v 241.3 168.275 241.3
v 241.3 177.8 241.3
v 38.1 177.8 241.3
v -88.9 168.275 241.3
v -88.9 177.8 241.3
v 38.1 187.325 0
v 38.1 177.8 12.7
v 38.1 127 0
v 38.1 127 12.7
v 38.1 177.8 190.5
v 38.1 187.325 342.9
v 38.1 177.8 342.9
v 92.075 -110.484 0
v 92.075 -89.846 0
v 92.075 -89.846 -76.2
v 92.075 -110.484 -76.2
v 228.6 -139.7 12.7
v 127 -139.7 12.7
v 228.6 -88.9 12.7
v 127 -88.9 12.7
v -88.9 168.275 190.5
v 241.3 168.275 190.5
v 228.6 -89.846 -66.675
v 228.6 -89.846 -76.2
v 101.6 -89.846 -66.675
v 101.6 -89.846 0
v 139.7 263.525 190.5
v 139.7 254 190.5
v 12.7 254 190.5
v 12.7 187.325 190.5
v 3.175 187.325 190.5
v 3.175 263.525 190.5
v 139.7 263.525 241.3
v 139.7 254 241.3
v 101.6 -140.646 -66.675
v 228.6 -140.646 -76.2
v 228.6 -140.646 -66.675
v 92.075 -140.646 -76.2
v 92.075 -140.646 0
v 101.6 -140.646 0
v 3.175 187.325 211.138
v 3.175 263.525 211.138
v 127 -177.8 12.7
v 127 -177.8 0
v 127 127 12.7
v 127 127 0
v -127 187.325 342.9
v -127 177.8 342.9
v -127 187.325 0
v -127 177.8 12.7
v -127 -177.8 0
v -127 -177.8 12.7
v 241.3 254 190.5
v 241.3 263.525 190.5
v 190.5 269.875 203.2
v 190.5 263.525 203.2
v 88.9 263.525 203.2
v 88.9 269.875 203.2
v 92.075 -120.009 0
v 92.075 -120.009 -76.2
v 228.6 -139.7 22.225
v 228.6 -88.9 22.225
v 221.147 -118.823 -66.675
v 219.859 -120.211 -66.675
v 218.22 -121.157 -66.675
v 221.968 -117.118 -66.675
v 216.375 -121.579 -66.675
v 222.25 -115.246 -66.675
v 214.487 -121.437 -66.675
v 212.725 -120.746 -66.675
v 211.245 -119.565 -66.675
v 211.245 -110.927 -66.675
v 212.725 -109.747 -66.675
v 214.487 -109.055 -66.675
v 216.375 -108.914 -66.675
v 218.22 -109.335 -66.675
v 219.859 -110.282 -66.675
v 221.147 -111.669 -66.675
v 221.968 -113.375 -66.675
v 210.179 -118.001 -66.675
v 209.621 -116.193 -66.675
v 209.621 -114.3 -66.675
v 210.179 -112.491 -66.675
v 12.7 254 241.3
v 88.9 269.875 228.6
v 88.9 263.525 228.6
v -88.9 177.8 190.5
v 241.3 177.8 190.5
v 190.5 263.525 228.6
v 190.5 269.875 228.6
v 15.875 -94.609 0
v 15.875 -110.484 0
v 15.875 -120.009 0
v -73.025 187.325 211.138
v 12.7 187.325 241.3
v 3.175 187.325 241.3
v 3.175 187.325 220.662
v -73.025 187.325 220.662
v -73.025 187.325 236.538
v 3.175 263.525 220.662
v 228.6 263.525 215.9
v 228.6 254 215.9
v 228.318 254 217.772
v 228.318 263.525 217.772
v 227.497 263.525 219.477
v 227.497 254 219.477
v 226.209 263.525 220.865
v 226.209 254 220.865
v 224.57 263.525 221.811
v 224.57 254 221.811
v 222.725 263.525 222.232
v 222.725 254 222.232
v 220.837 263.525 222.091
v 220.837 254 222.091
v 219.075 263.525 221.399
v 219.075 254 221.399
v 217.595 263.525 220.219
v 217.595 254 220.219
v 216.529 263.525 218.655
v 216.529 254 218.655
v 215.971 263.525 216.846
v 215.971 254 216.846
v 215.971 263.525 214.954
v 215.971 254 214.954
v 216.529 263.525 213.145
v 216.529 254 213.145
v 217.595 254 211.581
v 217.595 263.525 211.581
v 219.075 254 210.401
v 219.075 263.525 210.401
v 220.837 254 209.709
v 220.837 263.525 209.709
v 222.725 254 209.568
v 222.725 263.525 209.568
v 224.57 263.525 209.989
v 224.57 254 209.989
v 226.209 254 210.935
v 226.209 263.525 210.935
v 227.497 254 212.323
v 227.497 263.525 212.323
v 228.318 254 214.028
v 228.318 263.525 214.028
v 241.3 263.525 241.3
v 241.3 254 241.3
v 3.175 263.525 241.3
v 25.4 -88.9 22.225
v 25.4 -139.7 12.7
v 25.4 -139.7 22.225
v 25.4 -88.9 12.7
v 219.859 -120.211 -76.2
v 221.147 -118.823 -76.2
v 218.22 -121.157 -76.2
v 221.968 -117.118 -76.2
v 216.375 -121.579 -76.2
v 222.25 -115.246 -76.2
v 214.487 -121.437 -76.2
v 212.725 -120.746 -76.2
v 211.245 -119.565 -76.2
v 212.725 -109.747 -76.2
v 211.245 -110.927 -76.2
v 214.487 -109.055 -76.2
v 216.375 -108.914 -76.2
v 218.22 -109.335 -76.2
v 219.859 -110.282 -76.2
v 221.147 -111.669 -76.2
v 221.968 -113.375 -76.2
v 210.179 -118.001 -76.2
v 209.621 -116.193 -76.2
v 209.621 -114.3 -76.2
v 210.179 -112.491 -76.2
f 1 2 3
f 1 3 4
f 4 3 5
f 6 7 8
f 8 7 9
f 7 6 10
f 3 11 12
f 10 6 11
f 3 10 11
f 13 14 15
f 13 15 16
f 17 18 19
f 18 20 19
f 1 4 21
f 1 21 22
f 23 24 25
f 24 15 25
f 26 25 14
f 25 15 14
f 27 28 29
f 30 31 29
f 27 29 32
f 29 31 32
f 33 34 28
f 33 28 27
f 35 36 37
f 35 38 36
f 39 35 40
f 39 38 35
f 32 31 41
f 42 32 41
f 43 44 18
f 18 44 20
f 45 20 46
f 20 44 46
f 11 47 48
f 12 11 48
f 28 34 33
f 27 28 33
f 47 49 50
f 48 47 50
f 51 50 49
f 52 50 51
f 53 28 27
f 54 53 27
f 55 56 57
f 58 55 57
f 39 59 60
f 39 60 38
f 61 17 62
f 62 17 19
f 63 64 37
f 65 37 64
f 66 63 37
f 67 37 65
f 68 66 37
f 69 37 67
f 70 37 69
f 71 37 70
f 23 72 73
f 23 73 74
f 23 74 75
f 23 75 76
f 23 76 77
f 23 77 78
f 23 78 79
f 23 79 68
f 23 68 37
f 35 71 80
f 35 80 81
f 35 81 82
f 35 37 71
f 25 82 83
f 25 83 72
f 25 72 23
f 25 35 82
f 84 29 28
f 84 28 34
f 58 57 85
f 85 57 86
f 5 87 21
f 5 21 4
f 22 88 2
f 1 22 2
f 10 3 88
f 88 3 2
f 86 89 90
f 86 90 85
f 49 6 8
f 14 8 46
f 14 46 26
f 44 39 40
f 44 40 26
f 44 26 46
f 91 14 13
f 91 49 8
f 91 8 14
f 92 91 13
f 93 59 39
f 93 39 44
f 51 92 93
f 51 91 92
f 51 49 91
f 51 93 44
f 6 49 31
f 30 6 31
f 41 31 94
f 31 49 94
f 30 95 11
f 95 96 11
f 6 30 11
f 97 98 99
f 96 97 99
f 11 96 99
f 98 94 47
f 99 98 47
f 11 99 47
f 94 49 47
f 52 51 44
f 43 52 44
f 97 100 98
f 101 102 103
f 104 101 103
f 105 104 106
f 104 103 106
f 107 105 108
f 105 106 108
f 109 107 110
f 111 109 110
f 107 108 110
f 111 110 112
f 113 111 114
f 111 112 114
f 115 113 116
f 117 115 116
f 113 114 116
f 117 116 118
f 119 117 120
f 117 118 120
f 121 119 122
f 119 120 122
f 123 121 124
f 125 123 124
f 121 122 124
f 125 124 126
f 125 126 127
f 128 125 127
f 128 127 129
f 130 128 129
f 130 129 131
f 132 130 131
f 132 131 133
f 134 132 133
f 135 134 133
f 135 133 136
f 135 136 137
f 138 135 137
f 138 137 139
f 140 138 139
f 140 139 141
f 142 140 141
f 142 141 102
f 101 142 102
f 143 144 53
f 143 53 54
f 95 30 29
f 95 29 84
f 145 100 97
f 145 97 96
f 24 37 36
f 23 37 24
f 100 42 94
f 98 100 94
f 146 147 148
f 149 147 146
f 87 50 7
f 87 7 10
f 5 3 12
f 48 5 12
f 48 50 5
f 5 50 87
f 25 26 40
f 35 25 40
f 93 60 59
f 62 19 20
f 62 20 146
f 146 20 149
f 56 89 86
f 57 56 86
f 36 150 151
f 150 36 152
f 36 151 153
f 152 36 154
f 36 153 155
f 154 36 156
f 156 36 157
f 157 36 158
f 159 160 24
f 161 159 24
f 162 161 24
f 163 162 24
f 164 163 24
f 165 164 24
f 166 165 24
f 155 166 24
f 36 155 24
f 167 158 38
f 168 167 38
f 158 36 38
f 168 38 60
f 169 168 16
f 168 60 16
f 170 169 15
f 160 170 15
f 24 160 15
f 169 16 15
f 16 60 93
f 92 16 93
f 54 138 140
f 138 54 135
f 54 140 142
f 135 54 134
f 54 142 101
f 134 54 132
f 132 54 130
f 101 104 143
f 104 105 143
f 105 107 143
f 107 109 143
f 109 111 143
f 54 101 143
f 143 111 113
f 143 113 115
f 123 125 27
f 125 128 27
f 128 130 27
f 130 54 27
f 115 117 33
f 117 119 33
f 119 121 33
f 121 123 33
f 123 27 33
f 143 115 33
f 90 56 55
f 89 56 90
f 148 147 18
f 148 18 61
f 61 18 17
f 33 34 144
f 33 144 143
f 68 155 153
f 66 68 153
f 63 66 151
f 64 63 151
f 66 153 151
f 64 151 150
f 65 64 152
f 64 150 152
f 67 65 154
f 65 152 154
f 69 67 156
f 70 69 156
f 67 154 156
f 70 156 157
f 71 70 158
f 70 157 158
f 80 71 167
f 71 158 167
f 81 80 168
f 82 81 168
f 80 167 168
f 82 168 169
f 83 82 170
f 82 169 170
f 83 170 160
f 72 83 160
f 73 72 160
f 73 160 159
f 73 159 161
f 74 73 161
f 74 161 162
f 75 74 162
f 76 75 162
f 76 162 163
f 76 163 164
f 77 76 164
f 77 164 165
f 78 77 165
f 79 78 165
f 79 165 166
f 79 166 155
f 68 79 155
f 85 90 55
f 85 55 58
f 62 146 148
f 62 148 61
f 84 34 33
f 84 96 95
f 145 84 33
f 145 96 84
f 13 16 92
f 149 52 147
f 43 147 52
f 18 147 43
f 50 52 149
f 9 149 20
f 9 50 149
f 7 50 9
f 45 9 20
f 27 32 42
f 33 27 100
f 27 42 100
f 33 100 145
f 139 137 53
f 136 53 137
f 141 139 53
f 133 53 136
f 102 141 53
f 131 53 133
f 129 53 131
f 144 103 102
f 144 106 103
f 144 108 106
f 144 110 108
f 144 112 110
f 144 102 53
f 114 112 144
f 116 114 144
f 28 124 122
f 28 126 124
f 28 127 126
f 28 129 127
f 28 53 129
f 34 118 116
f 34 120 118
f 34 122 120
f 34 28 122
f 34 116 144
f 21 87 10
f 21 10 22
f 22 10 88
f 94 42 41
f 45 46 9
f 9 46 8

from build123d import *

# Parameters (mm, degrees)
F1_DEPTH   = 12.7
F2_W       = 101.6
F2_H       = 50.8
F3_DEPTH   = 9.525
F4_W       = 9.525
F4_H       = 342.9
F5_DEPTH   = 165.1
F6_W       = 127
F6_H       = 50.8
F6_W_2     = 203.2
F7_DEPTH   = 9.525
F8_W       = 9.525
F8_H       = 50.8
F9_DEPTH   = 76.2
F10_W      = 50.8
F10_H      = 9.525
F11_DEPTH  = 127
F12_W      = 9.525
F12_H      = 76.2
F13_DEPTH  = 76.2
F15_DEPTH  = 25.4
F16_R      = 6.35
F17_DEPTH  = 25.4
F18_W      = 9.525
F18_H      = 50.8
F19_DEPTH  = 76.2
F20_W      = 9.525
F20_H      = 50.8
F21_DEPTH  = 127
F21_FACE_W = 9.525
F21_FACE_H = 50.8
F22_DEPTH  = 101.6
F23_W      = 101.6
F23_H      = 25.4
F24_DEPTH  = 6.35
F25_R      = 6.35
F26_DEPTH  = 25.4
F27_W      = 76.2
F27_H      = 9.525
F28_DEPTH  = 76.2
F30_DEPTH  = 25.4


with BuildPart() as f1:
    # F0 (on Top) → F1 (new body)
    with BuildSketch(Plane.XY):
        Polygon((-127, -177.8), (127, -177.8), (127, 127), (38.1, 127), (38.1, 177.8), (-127, 177.8), align=None)
    extrude(amount=F1_DEPTH)

    # F2 (on face) → F3 (join)
    with BuildSketch(Plane.XY.offset(12.7)):
        with Locations((177.8, -114.3)):
            Rectangle(F2_W, F2_H)
        with Locations((76.2, -114.3)):
            Rectangle(F2_W, F2_H)
    extrude(amount=F3_DEPTH)

    # F4 (on face) → F5 (join, through all)
    with BuildSketch(Plane(origin=(-127, 0, 0), x_dir=(0, -1, 0), z_dir=(-1, 0, 0))):
        with Locations((-182.5625, 171.45)):
            Rectangle(F4_W, F4_H)
    extrude(amount=-F5_DEPTH)

    # F6 (on face) → F7 (join)
    with BuildSketch(Plane.XZ.offset(-177.8)):
        with Locations((-25.4, 215.9)):
            Rectangle(F6_W, F6_H)
        with Locations((139.7, 215.9)):
            Rectangle(F6_W_2, F6_H)
    extrude(amount=F7_DEPTH)

    # F8 (on face) → F9 (join)
    with BuildSketch(Plane(origin=(0, 0, 0), x_dir=(1, 0, 0), z_dir=(0, 0, -1))):
        with Locations((96.8375, 115.246274)):
            Rectangle(F8_W, F8_H)
    extrude(amount=F9_DEPTH)

    # F10 (on face) → F11 (join)
    with BuildSketch(Plane.YZ.offset(101.6)):
        with Locations((-115.246274, -71.4375)):
            Rectangle(F10_W, F10_H)
    extrude(amount=F11_DEPTH)

    # F12 (on face) → F13 (join)
    with BuildSketch(Plane(origin=(92.075, 0, 0), x_dir=(0, -1, 0), z_dir=(-1, 0, 0))):
        with Locations((115.246274, -38.1)):
            Rectangle(F12_W, F12_H)
    extrude(amount=F13_DEPTH)

    # F14 (on face) → F15 (cut)
    with BuildSketch(Plane.XZ.offset(120.008774)):
        Polygon((92.075, -76.2), (15.875, 0), (15.875, -76.2), align=None)
    extrude(amount=-F15_DEPTH, mode=Mode.SUBTRACT)

    # F16 (on face) → F17 (cut)
    with BuildSketch(Plane(origin=(0, 0, -76.2), x_dir=(1, 0, 0), z_dir=(0, 0, -1))):
        with Locations((215.9, 115.246274)):
            Circle(F16_R)
    extrude(amount=-F17_DEPTH, mode=Mode.SUBTRACT)

    # F18 (on face) → F19 (join)
    with BuildSketch(Plane(origin=(0, 187.325, 0), x_dir=(-1, 0, 0), z_dir=(0, 1, 0))):
        with Locations((-7.9375, 215.9)):
            Rectangle(F18_W, F18_H)
    extrude(amount=F19_DEPTH)

    # F20 (on face) → F21 (join)
    with BuildSketch(Plane.YZ.offset(12.7)):
        with Locations((258.7625, 215.9)):
            Rectangle(F20_W, F20_H)
    extrude(amount=F21_DEPTH)

    # F27 (on face) → F28 (join)
    with BuildSketch(Plane(origin=(3.175, 0, 0), x_dir=(0, -1, 0), z_dir=(-1, 0, 0))):
        with Locations((-225.425, 215.9)):
            Rectangle(F27_W, F27_H)
    extrude(amount=F28_DEPTH)

    # F29 (on face) → F30 (cut)
    with BuildSketch(Plane(origin=(0, 0, 211.1375), x_dir=(1, 0, 0), z_dir=(0, 0, -1))):
        Polygon((-73.025, -263.525), (3.175, -263.525), (-73.025, -187.325), align=None)
    extrude(amount=-F30_DEPTH, mode=Mode.SUBTRACT)


with BuildPart() as f22:
    # F21_face (on face) → F22 (new body)
    with BuildSketch(Plane(origin=(139.7, 258.7625, 215.9), x_dir=(0, 1, 0), z_dir=(1, 0, 0))):
        Rectangle(F21_FACE_W, F21_FACE_H)
    extrude(amount=F22_DEPTH)

    # F25 (on face) → F26 (cut)
    with BuildSketch(Plane.XZ.offset(-254)):
        with Locations((222.25, 215.9)):
            Circle(F25_R)
    extrude(amount=-F26_DEPTH, mode=Mode.SUBTRACT)


with BuildPart() as f24:
    # F23 (on face) → F24 (new body)
    with BuildSketch(Plane(origin=(0, 263.525, 0), x_dir=(-1, 0, 0), z_dir=(0, 1, 0))):
        with Locations((-139.7, 215.9)):
            Rectangle(F23_W, F23_H)
    extrude(amount=F24_DEPTH)


solid = Compound([f1.part, f22.part, f24.part])
